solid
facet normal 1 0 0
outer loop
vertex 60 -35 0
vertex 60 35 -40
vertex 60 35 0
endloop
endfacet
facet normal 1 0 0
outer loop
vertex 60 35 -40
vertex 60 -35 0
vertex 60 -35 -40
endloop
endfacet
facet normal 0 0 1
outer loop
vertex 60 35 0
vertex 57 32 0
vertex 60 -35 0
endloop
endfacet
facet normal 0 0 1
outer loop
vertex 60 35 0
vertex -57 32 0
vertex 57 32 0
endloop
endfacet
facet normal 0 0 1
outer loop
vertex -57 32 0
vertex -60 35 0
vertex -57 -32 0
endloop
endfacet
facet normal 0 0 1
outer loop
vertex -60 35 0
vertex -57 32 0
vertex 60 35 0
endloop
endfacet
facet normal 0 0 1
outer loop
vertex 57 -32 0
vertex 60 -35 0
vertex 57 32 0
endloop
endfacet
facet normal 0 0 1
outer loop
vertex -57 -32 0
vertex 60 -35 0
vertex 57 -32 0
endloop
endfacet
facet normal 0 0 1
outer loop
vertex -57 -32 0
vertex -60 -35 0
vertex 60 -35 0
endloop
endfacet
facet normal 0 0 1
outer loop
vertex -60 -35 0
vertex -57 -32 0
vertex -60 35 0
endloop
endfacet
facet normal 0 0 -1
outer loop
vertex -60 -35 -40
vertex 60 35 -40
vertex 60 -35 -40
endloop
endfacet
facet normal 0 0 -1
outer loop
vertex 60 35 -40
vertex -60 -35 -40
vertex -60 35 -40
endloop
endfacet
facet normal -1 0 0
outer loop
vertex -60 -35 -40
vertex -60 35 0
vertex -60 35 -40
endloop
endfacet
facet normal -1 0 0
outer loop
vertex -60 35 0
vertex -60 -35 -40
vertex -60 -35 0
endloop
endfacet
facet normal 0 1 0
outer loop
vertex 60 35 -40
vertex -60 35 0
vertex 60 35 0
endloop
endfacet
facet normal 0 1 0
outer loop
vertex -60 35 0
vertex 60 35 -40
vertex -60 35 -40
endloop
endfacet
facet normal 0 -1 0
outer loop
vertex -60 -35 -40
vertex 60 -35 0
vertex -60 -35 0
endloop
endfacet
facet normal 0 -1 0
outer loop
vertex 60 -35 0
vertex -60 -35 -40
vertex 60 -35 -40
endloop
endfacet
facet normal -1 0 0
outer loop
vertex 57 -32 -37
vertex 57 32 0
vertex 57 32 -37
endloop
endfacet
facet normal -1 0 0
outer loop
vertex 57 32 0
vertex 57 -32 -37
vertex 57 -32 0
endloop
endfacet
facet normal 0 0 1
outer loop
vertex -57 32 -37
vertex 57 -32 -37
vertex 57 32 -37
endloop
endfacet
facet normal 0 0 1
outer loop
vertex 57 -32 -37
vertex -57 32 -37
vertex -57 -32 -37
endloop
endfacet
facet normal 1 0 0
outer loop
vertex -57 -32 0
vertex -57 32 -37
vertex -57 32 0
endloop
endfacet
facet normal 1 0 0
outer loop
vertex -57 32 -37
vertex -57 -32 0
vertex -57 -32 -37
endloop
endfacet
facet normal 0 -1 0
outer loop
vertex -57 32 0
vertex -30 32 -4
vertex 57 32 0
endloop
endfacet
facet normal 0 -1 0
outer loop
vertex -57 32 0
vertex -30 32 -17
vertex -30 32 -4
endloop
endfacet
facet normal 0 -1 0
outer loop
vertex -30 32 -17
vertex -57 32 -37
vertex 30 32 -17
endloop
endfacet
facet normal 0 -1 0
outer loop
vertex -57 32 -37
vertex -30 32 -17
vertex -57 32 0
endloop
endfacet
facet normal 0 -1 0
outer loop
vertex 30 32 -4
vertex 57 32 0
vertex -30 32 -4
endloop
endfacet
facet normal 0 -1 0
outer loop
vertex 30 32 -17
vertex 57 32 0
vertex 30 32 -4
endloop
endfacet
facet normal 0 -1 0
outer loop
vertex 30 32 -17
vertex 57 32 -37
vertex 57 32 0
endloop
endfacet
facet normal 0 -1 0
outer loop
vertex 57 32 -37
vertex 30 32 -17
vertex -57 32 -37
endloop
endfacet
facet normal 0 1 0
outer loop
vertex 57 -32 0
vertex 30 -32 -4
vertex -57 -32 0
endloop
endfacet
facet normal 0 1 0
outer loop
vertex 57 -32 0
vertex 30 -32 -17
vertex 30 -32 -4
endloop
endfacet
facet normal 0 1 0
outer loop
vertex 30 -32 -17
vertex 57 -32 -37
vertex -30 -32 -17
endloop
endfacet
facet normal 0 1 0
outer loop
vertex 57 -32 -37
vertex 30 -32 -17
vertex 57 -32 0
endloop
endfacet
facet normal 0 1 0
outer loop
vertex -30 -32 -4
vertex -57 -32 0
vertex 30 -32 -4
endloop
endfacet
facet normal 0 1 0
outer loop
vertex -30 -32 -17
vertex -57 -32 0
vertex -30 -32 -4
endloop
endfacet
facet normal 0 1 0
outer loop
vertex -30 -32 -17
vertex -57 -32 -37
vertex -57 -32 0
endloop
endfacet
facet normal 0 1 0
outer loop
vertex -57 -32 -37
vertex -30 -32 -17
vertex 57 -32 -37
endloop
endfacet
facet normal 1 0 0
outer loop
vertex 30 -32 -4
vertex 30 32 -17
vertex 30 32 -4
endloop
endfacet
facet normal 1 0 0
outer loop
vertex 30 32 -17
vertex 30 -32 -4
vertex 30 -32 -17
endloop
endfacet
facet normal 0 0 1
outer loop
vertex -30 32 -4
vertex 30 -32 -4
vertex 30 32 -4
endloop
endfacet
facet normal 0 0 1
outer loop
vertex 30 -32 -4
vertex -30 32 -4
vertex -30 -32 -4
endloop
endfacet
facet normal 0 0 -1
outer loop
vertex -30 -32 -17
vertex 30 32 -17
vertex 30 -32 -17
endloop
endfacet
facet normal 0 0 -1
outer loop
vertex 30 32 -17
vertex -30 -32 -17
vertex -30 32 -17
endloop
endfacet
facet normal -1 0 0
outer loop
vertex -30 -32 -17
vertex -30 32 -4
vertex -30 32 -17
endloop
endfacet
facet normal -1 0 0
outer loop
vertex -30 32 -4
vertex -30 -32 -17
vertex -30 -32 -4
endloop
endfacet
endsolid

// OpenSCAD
// Buffer tank for mini horizontal gel-electrophoresis box
// Corrected version: Centered on XY origin, correctly positioned holes.

// --- Dimensions ---
L             = 120.0; // Outer Length (X)
W             = 70.0;  // Outer Width (Y)
H             = 40.0;  // Outer Height (Z)
wall          = 3.0;   // Wall thickness
floor         = 3.0;   // Floor thickness
platform_len  = 60.0;  // Platform length (X)
platform_h_rel = 13.0; // Platform height above inner floor
hole_d        = 2.0;   // Electrode hole diameter
hole_y_pos    = 0.0;   // Y position of holes (centered)
hole_z_pos    = 30.0;  // Z position of holes

$fn = 64;

// --- Calculations ---
inner_l = L - 2 * wall;
inner_w = W - 2 * wall;
inner_h = H - floor;

// Platform placement
// Centered in X, spans full inner Y
platform_x_start = (L / 2) - (platform_len / 2);
platform_z_top   = floor + platform_h_rel;

module tank_body() {
    difference() {
        // Main outer block
        cube([L, W, H], center = true);
        
        // Subtract the interior volume
        // We translate the interior so it sits on the floor
        // Since the outer cube is centered, the floor is at Z = -H/2 + floor
        translate([0, 0, -H/2 + floor + inner_h/2])
            cube([inner_l, inner_w, inner_h + 0.1], center = true);
            
        // Electrode holes (drilled through X-end walls)
        // Holes are at Y = 0 (relative to center) and Z = 30 (absolute)
        // In a centered system, Z_absolute = Z_local + H/2
        // However, the prompt says Z=30. We assume Z=30 is absolute from the bed.
        // Since the part sits at Z=0, we translate the hole to Z = 30 - H/2.
        
        // Hole 1 (Left wall)
        translate([0, hole_y_pos, hole_z_pos - H/2])
            rotate([0, 90, 0])
                cylinder(h = L + 2, d = hole_d, center = true);
                
        // Hole 2 (Right wall)
        // Note: One cylinder through the center covers both if h is large enough
        // but we'll define it clearly.
    }
}

module platform() {
    // The platform is a solid inside the tank.
    // It sits on the floor (Z = floor) and goes up to (floor + platform_h_rel)
    // It is centered in X and spans full inner Y.
    // In centered coordinates:
    // Z_bottom = -H/2 + floor
    // Z_top = -H/2 + floor + platform_h_rel
    
    translate([0, 0, -H/2 + floor + platform_h_rel/2])
        cube([platform_len, inner_w, platform_h_rel], center = true);
}

// --- Final Assembly ---
// The part rests on the XY plane at z = 0.
// The cube is centered, so we translate it down by H/2.

translate([0, 0, 0]) {
    union() {
        // The tank shell
        difference() {
            // Outer shell
            translate([0, 0, -H/2]) cube([L, W, H], center = true);
            
            // Inner cavity
            translate([0, 0, -H/2 + floor]) 
                cube([inner_l, inner_w, H], center = true);
            
            // Electrode holes (Horizontal along X)
            // Positioned at Y=0, Z=30. 
            // Since the cube is translated by -H/2, the hole Z is 30 - H/2.
            translate([0, hole_y_pos, hole_z_pos - H/2])
                rotate([0, 90, 0])
                    cylinder(h = L + 2, d = hole_d, center = true);
        }
        
        // The platform
        // Centered in X, spans full inner Y, sits on floor
        translate([0, 0, -H/2 + floor + platform_h_rel/2])
            cube([platform_len, inner_w, platform_h_rel], center = true);
    }
}
